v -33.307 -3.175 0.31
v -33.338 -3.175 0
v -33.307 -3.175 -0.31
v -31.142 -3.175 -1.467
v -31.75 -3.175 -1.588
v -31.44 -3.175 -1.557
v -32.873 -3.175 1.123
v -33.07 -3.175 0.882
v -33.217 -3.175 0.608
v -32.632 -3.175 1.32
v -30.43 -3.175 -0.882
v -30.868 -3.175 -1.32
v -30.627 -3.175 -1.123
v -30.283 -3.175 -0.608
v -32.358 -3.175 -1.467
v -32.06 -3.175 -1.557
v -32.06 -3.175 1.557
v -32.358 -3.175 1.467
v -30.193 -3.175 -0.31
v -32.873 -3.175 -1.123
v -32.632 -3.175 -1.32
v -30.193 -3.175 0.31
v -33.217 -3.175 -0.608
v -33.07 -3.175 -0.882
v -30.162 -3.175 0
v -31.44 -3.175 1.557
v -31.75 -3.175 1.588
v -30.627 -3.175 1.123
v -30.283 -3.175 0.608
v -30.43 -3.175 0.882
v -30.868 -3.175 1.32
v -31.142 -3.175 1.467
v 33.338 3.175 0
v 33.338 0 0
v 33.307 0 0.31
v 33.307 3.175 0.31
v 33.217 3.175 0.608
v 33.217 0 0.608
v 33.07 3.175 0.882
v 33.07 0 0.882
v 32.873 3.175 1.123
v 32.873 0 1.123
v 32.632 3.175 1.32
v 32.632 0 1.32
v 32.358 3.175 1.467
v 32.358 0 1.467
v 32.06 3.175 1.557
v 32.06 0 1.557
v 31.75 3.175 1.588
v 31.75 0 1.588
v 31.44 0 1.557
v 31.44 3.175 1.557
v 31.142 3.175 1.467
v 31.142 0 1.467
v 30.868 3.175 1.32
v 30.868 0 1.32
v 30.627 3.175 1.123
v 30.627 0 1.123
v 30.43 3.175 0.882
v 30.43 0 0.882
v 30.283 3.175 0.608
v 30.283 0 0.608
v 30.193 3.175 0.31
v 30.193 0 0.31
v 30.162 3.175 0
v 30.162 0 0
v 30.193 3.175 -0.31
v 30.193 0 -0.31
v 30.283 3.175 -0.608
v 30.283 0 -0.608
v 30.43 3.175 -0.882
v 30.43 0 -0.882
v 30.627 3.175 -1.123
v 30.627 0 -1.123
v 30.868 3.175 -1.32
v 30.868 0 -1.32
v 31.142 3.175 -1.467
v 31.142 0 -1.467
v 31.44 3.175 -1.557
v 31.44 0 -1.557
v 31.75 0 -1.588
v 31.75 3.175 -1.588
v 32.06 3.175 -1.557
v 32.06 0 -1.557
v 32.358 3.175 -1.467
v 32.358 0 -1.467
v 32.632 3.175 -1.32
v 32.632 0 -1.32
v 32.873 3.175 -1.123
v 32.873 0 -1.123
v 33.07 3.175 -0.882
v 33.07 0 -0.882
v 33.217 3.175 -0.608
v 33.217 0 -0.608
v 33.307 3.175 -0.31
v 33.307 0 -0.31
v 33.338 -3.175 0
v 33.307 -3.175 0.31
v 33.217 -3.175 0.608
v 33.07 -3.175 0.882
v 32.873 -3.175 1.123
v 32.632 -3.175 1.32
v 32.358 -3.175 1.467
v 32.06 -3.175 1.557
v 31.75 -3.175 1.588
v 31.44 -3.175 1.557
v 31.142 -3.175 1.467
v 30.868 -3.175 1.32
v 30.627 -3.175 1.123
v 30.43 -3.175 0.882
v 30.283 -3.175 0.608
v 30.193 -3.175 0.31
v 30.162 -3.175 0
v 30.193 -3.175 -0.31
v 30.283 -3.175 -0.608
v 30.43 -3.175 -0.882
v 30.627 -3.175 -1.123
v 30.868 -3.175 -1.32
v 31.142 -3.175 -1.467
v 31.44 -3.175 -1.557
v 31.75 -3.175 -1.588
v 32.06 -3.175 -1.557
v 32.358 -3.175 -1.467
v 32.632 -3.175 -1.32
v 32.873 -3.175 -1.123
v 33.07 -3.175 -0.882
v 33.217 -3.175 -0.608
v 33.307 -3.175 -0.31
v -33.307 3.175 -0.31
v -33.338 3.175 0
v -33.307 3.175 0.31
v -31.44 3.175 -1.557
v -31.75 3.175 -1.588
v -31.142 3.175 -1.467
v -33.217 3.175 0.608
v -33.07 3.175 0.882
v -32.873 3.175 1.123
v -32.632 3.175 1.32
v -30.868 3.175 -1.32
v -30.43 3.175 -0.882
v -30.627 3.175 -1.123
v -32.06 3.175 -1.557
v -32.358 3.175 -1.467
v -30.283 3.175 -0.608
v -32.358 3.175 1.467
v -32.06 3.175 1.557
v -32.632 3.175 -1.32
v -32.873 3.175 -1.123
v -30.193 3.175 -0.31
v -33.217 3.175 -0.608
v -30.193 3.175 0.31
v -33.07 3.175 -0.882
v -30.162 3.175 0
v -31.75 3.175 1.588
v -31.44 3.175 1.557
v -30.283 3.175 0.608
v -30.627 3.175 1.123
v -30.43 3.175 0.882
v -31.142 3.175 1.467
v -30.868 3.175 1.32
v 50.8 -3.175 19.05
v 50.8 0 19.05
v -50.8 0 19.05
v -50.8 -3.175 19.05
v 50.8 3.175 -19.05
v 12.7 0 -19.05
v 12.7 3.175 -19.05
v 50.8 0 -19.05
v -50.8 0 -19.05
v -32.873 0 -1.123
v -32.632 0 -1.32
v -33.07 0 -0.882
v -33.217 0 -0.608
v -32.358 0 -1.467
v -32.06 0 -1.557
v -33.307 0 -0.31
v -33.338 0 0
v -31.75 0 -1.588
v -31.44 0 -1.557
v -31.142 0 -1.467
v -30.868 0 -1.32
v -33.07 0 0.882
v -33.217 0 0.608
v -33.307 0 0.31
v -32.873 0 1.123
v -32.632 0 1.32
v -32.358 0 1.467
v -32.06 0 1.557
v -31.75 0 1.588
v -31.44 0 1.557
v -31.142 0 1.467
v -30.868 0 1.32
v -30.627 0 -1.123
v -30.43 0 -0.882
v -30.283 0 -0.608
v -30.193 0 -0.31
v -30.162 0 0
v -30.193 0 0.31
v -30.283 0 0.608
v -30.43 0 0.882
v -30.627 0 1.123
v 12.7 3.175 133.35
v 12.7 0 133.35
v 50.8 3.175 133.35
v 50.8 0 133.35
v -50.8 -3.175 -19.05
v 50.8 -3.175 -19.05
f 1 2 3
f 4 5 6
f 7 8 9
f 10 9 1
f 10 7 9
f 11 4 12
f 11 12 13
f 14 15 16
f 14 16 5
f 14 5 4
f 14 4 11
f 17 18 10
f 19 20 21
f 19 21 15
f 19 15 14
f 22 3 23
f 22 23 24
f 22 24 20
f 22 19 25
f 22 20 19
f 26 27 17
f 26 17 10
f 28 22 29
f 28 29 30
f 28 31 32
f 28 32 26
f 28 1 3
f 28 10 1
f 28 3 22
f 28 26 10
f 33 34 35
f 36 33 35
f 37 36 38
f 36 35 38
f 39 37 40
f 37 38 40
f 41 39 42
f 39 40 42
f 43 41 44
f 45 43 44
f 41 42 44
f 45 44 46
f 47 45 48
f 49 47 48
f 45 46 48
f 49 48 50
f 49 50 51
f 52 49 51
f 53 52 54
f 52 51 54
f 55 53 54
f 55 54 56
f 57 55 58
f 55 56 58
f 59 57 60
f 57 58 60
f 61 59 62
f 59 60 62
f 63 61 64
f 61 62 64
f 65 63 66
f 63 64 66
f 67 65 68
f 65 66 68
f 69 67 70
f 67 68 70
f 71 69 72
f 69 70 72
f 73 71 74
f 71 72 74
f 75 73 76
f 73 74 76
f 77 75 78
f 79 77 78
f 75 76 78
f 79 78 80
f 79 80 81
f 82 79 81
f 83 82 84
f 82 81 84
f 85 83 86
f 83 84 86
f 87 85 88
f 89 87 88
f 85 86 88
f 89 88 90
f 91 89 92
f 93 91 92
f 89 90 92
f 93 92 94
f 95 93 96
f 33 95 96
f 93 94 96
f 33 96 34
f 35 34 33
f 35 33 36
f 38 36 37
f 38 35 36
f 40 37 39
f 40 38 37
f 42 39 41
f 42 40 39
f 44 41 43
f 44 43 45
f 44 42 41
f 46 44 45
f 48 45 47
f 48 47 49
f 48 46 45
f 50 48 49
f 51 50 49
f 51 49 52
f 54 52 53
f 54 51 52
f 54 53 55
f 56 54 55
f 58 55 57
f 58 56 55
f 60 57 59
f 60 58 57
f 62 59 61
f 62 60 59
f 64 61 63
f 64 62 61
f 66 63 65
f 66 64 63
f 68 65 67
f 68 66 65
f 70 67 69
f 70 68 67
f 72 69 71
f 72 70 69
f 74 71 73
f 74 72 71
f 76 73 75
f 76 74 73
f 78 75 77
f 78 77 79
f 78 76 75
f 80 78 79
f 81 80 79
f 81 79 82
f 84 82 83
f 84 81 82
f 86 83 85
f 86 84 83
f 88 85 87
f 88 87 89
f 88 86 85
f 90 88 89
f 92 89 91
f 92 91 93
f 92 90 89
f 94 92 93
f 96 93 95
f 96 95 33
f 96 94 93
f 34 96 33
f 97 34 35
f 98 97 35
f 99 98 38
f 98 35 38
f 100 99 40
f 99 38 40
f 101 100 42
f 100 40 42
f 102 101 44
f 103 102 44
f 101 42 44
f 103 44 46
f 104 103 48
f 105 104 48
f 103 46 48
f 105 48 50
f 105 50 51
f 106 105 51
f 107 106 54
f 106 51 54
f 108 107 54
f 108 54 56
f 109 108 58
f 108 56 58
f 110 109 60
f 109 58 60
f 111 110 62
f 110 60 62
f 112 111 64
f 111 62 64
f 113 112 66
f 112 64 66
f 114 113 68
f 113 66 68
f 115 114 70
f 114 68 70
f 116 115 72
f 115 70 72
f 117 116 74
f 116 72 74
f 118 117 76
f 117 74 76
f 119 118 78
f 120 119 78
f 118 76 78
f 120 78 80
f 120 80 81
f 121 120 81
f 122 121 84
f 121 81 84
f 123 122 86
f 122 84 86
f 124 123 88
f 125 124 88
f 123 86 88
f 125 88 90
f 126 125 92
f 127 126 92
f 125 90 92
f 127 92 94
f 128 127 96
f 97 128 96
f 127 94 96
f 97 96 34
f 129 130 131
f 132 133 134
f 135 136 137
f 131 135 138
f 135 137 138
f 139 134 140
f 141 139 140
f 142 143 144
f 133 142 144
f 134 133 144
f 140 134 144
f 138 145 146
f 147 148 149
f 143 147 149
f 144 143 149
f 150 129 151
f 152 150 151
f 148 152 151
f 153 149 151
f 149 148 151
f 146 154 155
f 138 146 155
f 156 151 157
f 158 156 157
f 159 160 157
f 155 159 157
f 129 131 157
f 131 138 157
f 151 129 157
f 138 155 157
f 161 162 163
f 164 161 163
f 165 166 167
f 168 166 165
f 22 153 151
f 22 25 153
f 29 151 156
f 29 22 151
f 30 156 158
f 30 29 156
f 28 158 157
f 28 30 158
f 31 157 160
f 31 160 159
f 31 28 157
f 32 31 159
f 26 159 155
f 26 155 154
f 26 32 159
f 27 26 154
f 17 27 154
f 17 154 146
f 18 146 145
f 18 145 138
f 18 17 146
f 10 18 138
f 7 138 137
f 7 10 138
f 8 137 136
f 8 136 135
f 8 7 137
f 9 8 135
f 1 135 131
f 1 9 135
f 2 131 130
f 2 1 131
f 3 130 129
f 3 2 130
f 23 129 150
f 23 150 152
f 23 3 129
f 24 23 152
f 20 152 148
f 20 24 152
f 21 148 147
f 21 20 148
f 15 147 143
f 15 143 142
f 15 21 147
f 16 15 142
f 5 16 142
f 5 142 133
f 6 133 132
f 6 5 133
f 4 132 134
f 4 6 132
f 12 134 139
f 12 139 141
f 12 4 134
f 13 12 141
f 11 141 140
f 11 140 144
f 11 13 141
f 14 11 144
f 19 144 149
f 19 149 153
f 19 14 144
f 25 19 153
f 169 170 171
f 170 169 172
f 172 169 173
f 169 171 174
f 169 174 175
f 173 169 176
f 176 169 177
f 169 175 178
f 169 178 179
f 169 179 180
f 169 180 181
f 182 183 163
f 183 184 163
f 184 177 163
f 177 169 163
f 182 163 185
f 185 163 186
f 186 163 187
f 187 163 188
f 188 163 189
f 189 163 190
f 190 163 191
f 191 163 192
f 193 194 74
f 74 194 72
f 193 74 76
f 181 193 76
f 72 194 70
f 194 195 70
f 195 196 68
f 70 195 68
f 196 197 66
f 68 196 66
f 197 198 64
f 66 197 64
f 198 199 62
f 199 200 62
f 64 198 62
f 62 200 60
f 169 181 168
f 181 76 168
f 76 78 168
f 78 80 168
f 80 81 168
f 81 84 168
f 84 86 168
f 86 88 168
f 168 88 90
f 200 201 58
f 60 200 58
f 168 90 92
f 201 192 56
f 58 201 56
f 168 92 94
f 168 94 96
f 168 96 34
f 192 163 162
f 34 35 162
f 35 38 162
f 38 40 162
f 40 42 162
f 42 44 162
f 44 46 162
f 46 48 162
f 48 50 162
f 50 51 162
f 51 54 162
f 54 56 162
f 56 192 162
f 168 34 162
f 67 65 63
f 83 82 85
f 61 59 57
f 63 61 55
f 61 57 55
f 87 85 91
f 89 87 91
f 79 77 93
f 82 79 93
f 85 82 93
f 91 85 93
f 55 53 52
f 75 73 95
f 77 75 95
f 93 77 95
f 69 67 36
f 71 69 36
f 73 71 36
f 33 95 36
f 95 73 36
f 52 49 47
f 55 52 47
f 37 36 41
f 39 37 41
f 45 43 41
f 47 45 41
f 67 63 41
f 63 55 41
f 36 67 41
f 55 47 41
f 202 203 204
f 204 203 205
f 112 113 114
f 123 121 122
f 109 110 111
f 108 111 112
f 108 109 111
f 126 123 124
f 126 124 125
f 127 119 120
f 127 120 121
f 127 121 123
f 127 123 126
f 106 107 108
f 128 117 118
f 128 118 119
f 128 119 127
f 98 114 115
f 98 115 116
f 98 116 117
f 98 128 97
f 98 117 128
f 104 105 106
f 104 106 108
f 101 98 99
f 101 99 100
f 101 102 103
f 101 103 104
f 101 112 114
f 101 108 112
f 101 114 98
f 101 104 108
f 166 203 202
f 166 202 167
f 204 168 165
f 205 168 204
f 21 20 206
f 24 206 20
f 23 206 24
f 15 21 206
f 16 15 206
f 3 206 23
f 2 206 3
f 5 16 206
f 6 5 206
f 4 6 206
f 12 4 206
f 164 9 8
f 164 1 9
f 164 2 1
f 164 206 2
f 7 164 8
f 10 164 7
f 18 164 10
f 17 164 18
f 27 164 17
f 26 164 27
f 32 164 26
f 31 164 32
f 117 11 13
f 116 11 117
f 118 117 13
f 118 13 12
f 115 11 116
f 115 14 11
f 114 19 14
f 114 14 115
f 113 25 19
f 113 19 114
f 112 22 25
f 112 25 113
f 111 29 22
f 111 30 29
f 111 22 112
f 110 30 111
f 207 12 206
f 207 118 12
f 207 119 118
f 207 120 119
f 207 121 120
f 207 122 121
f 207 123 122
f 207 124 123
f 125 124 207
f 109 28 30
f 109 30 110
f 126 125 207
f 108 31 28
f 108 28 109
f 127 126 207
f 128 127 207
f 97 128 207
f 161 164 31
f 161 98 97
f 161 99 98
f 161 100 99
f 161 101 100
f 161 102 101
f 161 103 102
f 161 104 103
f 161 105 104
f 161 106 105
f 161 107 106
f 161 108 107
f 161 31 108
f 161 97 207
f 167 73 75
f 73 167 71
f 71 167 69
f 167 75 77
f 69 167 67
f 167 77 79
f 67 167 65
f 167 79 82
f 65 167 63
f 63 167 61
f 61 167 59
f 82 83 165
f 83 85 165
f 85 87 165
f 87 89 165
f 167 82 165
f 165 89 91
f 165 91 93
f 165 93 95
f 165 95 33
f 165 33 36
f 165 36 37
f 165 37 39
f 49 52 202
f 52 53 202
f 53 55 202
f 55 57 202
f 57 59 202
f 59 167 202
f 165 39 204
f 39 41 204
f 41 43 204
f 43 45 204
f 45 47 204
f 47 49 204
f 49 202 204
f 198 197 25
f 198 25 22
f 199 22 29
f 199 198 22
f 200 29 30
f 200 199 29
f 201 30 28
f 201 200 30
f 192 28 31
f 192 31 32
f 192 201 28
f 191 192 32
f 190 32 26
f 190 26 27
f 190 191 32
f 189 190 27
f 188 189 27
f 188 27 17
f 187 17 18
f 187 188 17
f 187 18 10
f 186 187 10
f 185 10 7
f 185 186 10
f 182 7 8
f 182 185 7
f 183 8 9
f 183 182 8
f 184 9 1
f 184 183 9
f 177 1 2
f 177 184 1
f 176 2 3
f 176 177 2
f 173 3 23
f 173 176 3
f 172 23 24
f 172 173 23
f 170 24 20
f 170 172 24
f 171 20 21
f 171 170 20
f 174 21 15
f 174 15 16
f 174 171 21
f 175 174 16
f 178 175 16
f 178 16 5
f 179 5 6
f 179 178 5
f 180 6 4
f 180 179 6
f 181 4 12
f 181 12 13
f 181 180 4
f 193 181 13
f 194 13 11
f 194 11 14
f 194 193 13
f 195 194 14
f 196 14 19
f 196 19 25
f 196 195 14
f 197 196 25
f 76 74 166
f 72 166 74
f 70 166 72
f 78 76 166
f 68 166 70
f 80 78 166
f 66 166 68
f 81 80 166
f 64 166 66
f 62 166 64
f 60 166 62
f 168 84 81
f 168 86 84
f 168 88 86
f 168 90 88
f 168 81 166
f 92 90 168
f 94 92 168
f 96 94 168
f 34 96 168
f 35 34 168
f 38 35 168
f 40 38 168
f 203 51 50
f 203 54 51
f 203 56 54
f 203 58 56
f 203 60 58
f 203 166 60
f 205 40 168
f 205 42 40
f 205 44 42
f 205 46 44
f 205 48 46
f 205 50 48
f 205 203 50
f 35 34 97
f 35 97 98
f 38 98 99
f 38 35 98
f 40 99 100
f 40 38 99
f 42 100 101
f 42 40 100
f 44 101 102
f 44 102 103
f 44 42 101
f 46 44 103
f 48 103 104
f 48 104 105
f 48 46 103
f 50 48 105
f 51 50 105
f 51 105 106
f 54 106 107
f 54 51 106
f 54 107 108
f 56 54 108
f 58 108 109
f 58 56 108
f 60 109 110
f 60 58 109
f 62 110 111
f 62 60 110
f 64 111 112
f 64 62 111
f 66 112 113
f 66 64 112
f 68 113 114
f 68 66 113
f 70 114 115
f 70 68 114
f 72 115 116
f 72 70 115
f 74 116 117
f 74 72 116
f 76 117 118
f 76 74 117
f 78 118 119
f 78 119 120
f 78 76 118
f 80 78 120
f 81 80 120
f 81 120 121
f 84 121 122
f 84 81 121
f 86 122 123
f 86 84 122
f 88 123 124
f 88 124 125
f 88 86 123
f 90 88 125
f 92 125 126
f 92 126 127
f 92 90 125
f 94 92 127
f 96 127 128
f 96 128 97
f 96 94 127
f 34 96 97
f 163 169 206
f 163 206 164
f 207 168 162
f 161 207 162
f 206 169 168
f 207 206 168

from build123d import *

# Parameters (mm, degrees)
F0_W     = 63.5
F0_H     = 38.1
F0_R     = 1.5875
F0_W_2   = 38.1
F1_DEPTH = 3.175
F0_H_2   = 114.3
F2_DEPTH = 3.175
F3_DEPTH = 3.175


with BuildPart() as f1:
    # F0 (on Front) → F1 (new body)
    with BuildSketch(Plane.XZ):
        with Locations((-19.05, 0)):
            Rectangle(F0_W, F0_H)
        with Locations((-31.75, 0)):
            Circle(F0_R, mode=Mode.SUBTRACT)
        with Locations((31.75, 0)):
            Rectangle(F0_W_2, F0_H)
        with Locations((31.75, 0)):
            Circle(F0_R, mode=Mode.SUBTRACT)
    extrude(amount=F1_DEPTH)


with BuildPart() as f2:
    # F0 (on Front) → F2 (new body)
    with BuildSketch(Plane.XZ):
        with Locations((31.75, 76.2)):
            Rectangle(F0_W_2, F0_H_2)
        with Locations((31.75, 0)):
            Rectangle(F0_W_2, F0_H)
        with Locations((31.75, 0)):
            Circle(F0_R, mode=Mode.SUBTRACT)
    extrude(amount=-F2_DEPTH)


with BuildPart() as f3:
    # F0 (on Front) → F3 (new body, symmetric)
    with BuildSketch(Plane.XZ):
        with Locations((31.75, 0)):
            Circle(F0_R)
        with Locations((-31.75, 0)):
            Circle(F0_R)
    extrude(amount=F3_DEPTH, both=True)


solid = Compound([f1.part, f2.part, f3.part])
